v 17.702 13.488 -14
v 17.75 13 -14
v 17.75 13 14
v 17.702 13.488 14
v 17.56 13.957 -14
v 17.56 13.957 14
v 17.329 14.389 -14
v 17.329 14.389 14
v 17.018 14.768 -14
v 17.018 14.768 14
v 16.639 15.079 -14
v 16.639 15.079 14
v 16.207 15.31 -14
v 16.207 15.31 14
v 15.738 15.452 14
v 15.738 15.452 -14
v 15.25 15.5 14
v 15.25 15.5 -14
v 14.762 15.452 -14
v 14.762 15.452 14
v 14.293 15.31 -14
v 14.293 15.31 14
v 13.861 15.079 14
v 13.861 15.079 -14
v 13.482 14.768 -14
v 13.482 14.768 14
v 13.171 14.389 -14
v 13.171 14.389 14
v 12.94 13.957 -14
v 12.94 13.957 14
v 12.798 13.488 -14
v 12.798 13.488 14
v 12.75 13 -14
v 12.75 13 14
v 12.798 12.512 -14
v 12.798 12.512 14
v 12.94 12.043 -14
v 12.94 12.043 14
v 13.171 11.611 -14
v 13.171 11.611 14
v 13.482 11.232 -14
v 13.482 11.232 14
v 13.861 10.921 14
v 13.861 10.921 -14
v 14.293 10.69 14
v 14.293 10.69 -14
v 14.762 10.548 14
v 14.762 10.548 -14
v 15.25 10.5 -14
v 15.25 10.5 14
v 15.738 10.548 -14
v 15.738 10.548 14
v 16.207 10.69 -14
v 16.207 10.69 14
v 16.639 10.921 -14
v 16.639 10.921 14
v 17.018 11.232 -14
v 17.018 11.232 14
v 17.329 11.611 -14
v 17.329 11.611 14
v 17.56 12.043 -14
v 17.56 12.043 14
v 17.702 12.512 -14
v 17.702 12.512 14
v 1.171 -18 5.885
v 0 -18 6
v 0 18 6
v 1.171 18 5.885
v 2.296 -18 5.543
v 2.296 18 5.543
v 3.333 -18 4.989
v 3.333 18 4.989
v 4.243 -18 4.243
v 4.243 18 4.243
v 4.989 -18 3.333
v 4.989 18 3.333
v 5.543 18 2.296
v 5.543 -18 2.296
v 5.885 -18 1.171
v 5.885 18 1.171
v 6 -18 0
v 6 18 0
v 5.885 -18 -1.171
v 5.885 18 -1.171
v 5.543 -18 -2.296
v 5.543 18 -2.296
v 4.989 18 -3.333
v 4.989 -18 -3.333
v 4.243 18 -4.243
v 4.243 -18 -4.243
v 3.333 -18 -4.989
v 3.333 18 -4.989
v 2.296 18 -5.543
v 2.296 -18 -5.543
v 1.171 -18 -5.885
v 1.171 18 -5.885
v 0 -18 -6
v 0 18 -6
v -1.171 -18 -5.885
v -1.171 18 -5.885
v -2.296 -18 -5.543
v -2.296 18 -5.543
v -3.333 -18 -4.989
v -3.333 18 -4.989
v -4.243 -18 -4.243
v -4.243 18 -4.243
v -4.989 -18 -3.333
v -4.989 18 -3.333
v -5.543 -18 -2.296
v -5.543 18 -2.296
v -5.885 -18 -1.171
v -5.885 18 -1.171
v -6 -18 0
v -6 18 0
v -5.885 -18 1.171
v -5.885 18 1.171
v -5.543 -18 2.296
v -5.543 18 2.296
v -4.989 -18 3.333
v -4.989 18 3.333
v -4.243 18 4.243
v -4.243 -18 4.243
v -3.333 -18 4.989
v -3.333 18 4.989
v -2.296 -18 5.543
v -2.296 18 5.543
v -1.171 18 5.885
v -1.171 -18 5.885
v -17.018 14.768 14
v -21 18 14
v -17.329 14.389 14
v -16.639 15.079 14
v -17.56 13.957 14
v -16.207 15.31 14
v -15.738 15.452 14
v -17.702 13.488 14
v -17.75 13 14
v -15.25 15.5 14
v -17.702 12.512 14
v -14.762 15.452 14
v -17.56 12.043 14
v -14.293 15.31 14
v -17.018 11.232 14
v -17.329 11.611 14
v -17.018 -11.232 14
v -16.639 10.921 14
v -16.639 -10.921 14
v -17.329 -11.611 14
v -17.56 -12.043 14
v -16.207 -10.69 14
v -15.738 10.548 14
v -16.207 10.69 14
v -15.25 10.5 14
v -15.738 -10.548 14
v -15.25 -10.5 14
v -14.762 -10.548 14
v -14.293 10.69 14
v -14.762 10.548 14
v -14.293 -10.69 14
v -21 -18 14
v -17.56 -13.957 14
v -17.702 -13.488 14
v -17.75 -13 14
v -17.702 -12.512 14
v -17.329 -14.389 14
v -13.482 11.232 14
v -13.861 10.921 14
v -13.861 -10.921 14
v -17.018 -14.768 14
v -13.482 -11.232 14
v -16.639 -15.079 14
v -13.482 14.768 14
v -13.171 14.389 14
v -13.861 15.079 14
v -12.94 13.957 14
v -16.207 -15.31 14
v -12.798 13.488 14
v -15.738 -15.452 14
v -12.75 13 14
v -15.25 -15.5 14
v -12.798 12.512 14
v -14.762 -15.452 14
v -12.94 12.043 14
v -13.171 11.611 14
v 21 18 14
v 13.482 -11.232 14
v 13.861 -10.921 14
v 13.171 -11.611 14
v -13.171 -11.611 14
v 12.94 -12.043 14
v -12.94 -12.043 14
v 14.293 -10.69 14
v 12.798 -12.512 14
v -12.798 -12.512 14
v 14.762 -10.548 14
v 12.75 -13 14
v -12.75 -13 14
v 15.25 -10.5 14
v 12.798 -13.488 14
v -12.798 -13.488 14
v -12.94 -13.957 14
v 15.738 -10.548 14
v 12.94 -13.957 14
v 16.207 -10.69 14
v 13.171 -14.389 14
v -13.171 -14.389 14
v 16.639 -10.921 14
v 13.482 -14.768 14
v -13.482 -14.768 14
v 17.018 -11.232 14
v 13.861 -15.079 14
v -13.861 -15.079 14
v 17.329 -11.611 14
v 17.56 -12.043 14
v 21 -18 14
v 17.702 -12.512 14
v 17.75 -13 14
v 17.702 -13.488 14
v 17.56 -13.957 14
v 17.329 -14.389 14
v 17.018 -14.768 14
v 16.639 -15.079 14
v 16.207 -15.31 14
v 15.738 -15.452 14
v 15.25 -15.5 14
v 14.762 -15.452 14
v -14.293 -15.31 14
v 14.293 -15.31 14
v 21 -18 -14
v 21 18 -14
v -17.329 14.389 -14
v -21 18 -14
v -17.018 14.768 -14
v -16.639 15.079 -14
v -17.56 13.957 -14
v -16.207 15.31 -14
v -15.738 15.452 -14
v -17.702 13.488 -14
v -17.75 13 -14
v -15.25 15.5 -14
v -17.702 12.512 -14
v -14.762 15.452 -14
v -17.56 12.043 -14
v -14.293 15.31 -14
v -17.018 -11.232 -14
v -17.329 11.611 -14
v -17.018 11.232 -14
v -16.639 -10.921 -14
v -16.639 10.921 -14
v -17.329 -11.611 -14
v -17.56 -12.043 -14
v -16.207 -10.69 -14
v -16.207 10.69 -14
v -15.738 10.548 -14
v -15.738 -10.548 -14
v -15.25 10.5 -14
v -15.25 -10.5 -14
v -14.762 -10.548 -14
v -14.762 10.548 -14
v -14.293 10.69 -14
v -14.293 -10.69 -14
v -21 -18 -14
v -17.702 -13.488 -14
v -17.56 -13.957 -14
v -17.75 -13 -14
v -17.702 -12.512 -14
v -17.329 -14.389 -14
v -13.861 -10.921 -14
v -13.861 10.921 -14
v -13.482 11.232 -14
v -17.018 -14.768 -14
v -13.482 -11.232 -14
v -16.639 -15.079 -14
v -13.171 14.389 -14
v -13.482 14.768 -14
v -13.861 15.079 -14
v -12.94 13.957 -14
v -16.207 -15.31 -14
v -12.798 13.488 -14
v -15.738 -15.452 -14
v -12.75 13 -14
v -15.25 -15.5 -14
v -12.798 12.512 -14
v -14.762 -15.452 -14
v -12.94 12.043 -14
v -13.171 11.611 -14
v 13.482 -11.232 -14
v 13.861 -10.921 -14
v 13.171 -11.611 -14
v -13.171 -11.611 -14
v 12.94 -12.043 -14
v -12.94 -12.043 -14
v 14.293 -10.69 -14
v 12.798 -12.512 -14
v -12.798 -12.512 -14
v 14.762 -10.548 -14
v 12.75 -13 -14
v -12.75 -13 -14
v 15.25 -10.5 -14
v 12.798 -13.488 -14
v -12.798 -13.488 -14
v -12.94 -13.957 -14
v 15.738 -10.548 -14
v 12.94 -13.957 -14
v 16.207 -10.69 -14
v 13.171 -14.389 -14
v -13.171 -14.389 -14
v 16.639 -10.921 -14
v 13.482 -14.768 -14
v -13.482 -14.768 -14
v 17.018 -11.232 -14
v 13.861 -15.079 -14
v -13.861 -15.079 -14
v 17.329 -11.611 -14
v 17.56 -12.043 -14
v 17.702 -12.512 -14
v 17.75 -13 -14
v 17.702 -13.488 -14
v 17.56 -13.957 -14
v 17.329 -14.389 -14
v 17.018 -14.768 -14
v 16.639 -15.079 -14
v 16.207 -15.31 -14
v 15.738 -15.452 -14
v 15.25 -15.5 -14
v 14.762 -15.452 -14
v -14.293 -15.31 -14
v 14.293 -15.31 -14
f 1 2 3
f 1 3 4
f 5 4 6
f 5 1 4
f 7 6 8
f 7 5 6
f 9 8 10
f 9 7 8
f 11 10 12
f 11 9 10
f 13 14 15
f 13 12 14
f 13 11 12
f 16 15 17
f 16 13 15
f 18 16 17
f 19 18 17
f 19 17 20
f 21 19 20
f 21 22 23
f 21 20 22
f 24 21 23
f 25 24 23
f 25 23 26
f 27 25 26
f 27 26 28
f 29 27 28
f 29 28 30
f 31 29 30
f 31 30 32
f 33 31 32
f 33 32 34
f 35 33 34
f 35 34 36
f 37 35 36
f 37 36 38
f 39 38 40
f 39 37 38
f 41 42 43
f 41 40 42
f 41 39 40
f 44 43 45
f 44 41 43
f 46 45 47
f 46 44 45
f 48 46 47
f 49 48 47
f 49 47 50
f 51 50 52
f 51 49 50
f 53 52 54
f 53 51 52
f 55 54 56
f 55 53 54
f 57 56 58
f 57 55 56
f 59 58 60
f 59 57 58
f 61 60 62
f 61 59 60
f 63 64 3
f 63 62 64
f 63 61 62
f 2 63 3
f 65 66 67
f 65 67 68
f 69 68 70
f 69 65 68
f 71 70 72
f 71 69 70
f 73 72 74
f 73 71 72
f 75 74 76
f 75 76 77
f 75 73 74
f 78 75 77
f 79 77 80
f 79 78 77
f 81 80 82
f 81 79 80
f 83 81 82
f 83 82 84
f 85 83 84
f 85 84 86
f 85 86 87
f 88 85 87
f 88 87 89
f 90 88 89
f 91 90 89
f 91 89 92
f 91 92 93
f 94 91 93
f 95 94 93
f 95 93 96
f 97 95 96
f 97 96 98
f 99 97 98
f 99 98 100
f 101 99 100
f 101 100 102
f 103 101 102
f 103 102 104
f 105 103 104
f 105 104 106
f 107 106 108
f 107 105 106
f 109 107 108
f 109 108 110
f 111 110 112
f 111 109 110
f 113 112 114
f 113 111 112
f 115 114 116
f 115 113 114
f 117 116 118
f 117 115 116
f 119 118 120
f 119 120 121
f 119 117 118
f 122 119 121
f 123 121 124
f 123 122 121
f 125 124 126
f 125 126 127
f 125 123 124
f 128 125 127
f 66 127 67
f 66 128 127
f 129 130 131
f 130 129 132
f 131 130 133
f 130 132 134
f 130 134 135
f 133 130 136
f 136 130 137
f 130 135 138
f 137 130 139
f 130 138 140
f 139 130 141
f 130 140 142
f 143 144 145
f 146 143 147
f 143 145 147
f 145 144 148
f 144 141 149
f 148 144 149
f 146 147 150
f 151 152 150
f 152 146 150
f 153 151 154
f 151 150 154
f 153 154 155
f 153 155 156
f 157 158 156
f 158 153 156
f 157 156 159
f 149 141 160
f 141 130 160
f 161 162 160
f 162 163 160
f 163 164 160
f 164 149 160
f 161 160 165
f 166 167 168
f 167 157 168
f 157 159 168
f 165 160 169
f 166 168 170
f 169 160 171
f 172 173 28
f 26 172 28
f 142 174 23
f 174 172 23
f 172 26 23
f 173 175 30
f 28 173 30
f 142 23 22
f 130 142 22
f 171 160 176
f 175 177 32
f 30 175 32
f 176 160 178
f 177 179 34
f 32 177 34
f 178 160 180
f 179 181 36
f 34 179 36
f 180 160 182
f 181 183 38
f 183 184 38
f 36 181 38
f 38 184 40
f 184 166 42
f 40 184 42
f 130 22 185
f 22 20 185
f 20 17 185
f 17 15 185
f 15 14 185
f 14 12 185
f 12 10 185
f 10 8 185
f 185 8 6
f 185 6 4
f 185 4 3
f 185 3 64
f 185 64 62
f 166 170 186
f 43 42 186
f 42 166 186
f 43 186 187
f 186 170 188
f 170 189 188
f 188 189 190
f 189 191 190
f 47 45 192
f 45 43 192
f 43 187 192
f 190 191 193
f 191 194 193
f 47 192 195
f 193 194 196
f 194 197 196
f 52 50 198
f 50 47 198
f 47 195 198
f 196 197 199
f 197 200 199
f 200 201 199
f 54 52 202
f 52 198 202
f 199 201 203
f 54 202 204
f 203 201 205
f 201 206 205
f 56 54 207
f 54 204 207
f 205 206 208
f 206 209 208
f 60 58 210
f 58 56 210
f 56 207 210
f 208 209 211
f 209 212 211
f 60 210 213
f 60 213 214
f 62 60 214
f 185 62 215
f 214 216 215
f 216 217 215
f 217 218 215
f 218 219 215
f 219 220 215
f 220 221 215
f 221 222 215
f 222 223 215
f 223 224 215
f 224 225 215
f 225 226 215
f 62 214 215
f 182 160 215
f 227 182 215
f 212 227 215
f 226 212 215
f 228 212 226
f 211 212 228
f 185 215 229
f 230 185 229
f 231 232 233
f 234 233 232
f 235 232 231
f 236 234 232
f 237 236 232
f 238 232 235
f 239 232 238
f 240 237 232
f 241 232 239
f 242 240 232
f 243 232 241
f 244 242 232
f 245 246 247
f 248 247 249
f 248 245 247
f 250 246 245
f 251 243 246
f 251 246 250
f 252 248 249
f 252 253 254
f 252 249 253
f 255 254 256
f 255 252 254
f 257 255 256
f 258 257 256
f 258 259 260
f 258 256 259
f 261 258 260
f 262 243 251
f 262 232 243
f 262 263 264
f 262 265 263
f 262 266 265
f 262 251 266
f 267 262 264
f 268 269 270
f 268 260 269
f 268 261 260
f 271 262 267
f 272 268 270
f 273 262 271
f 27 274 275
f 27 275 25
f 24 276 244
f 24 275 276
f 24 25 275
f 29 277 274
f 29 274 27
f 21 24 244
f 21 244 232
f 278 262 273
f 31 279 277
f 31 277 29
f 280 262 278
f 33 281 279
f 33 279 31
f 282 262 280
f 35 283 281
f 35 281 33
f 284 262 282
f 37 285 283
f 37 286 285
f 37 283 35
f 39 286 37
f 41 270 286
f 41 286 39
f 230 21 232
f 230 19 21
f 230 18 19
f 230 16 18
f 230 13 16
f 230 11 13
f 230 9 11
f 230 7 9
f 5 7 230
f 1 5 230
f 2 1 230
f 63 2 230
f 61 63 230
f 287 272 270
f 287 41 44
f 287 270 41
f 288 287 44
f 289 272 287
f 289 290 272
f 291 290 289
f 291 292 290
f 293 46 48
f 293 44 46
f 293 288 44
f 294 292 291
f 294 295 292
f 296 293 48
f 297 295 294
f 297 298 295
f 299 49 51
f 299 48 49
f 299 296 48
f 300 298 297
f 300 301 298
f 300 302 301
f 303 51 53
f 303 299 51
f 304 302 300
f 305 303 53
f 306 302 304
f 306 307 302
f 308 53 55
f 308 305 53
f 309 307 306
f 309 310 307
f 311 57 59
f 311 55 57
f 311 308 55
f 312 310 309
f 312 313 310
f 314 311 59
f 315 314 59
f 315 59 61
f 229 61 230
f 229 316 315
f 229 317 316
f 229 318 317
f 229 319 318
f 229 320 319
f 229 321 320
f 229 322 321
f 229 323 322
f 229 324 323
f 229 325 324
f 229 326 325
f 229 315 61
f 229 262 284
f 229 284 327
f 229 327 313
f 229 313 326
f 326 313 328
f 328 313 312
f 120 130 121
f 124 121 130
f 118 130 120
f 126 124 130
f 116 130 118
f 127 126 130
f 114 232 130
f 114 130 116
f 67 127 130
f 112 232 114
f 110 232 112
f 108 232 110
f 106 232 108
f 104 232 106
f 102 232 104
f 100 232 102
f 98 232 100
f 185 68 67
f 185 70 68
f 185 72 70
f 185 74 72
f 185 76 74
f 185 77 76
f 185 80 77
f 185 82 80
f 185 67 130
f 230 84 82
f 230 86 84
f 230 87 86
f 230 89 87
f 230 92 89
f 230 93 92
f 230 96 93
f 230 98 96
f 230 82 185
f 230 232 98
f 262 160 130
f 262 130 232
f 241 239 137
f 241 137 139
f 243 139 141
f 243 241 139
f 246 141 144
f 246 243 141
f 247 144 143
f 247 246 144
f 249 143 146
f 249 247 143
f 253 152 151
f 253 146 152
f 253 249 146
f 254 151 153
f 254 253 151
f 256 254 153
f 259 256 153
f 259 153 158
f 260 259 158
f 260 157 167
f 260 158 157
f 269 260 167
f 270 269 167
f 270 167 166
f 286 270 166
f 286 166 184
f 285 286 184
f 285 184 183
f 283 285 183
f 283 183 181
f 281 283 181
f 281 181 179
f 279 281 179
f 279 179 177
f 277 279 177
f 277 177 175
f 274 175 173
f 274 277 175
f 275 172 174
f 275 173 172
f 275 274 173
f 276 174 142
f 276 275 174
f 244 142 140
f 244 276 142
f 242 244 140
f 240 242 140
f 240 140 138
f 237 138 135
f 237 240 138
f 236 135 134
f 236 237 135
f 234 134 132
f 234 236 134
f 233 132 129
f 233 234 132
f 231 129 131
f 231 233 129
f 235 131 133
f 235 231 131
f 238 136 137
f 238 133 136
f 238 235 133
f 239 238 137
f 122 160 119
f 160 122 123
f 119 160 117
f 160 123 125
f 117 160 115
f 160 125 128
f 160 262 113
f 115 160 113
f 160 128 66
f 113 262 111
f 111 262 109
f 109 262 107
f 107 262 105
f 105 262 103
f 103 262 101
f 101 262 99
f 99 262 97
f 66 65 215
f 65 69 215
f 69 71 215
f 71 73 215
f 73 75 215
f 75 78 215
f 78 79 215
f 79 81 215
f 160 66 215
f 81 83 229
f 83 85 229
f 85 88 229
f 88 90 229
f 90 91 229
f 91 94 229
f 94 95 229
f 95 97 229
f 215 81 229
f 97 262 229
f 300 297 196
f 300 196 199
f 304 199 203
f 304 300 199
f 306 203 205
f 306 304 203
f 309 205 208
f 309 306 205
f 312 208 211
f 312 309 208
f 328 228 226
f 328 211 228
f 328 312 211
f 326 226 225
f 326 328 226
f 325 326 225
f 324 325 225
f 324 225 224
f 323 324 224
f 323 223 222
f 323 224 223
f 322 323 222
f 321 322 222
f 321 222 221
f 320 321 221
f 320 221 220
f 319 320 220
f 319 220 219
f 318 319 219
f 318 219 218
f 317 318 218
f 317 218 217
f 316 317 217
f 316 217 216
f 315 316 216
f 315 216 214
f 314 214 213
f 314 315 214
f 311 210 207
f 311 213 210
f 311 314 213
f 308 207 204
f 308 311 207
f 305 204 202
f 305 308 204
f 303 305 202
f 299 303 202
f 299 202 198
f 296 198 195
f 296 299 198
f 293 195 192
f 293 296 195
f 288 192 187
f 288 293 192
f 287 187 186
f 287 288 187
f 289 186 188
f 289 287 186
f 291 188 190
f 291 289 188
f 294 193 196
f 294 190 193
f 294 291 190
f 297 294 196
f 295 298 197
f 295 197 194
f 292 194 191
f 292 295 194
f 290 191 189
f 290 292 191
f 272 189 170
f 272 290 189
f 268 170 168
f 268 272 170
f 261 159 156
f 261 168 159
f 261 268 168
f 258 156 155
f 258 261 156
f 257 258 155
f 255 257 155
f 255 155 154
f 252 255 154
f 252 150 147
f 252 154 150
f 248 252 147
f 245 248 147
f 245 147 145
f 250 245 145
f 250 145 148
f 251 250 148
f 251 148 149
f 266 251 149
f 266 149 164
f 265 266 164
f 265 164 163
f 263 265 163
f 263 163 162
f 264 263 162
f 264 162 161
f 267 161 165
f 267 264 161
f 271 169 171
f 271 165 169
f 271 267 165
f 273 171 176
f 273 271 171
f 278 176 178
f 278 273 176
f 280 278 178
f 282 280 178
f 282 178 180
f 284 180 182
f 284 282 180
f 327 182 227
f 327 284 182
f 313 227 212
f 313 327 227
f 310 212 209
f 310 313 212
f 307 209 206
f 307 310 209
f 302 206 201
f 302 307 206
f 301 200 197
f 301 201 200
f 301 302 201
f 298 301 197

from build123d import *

# Parameters (mm, degrees)
SKETCH_1_W               = 42
SKETCH_1_H               = 28
SKETCH_1_R               = 6
EXTRUDE_2_DEPTH          = 18
EXTRUDE_START            = -18
SKETCH_1_2_W             = 42
SKETCH_1_2_H             = 28
SKETCH_1_2_R             = 6
EXTRUDE_3_DEPTH          = 18
CUT_EXTRUDE_3_DEPTH      = 32
CUT_EXTRUDE_3_DEPTH_BACK = 32
SKETCH_3_R               = 2.5


with BuildPart() as part:
    # 草图1 → 凸台-拉伸2 (new body)
    with BuildSketch(Plane(origin=(0, 0, 0), x_dir=(1, 0, 0), z_dir=(0, 1, 0))):
        Rectangle(SKETCH_1_W, SKETCH_1_H)
        Circle(SKETCH_1_R, mode=Mode.SUBTRACT)
    extrude(amount=EXTRUDE_2_DEPTH)

    # 草图1<2> → 凸台-拉伸3 (add)
    with BuildSketch(Plane(origin=(0, 0, 0), x_dir=(1, 0, 0), z_dir=(0, 1, 0)).offset(EXTRUDE_START)):
        Rectangle(SKETCH_1_2_W, SKETCH_1_2_H)
        Circle(SKETCH_1_2_R, mode=Mode.SUBTRACT)
    extrude(amount=EXTRUDE_3_DEPTH)

    # 草图3 → 切除-拉伸3 (cut, two sides: drawn at the far end of the back side and taken through both)
    with BuildSketch(Plane.XY.offset(-CUT_EXTRUDE_3_DEPTH_BACK)):
        with Locations((15.25, 13)):
            Circle(SKETCH_3_R)
        with Locations((-15.25, 13)):
            Circle(SKETCH_3_R)
        with Locations((15.25, -13)):
            Circle(SKETCH_3_R)
        with Locations((-15.25, -13)):
            Circle(SKETCH_3_R)
    extrude(amount=CUT_EXTRUDE_3_DEPTH + CUT_EXTRUDE_3_DEPTH_BACK, mode=Mode.SUBTRACT)


solid = part.part
